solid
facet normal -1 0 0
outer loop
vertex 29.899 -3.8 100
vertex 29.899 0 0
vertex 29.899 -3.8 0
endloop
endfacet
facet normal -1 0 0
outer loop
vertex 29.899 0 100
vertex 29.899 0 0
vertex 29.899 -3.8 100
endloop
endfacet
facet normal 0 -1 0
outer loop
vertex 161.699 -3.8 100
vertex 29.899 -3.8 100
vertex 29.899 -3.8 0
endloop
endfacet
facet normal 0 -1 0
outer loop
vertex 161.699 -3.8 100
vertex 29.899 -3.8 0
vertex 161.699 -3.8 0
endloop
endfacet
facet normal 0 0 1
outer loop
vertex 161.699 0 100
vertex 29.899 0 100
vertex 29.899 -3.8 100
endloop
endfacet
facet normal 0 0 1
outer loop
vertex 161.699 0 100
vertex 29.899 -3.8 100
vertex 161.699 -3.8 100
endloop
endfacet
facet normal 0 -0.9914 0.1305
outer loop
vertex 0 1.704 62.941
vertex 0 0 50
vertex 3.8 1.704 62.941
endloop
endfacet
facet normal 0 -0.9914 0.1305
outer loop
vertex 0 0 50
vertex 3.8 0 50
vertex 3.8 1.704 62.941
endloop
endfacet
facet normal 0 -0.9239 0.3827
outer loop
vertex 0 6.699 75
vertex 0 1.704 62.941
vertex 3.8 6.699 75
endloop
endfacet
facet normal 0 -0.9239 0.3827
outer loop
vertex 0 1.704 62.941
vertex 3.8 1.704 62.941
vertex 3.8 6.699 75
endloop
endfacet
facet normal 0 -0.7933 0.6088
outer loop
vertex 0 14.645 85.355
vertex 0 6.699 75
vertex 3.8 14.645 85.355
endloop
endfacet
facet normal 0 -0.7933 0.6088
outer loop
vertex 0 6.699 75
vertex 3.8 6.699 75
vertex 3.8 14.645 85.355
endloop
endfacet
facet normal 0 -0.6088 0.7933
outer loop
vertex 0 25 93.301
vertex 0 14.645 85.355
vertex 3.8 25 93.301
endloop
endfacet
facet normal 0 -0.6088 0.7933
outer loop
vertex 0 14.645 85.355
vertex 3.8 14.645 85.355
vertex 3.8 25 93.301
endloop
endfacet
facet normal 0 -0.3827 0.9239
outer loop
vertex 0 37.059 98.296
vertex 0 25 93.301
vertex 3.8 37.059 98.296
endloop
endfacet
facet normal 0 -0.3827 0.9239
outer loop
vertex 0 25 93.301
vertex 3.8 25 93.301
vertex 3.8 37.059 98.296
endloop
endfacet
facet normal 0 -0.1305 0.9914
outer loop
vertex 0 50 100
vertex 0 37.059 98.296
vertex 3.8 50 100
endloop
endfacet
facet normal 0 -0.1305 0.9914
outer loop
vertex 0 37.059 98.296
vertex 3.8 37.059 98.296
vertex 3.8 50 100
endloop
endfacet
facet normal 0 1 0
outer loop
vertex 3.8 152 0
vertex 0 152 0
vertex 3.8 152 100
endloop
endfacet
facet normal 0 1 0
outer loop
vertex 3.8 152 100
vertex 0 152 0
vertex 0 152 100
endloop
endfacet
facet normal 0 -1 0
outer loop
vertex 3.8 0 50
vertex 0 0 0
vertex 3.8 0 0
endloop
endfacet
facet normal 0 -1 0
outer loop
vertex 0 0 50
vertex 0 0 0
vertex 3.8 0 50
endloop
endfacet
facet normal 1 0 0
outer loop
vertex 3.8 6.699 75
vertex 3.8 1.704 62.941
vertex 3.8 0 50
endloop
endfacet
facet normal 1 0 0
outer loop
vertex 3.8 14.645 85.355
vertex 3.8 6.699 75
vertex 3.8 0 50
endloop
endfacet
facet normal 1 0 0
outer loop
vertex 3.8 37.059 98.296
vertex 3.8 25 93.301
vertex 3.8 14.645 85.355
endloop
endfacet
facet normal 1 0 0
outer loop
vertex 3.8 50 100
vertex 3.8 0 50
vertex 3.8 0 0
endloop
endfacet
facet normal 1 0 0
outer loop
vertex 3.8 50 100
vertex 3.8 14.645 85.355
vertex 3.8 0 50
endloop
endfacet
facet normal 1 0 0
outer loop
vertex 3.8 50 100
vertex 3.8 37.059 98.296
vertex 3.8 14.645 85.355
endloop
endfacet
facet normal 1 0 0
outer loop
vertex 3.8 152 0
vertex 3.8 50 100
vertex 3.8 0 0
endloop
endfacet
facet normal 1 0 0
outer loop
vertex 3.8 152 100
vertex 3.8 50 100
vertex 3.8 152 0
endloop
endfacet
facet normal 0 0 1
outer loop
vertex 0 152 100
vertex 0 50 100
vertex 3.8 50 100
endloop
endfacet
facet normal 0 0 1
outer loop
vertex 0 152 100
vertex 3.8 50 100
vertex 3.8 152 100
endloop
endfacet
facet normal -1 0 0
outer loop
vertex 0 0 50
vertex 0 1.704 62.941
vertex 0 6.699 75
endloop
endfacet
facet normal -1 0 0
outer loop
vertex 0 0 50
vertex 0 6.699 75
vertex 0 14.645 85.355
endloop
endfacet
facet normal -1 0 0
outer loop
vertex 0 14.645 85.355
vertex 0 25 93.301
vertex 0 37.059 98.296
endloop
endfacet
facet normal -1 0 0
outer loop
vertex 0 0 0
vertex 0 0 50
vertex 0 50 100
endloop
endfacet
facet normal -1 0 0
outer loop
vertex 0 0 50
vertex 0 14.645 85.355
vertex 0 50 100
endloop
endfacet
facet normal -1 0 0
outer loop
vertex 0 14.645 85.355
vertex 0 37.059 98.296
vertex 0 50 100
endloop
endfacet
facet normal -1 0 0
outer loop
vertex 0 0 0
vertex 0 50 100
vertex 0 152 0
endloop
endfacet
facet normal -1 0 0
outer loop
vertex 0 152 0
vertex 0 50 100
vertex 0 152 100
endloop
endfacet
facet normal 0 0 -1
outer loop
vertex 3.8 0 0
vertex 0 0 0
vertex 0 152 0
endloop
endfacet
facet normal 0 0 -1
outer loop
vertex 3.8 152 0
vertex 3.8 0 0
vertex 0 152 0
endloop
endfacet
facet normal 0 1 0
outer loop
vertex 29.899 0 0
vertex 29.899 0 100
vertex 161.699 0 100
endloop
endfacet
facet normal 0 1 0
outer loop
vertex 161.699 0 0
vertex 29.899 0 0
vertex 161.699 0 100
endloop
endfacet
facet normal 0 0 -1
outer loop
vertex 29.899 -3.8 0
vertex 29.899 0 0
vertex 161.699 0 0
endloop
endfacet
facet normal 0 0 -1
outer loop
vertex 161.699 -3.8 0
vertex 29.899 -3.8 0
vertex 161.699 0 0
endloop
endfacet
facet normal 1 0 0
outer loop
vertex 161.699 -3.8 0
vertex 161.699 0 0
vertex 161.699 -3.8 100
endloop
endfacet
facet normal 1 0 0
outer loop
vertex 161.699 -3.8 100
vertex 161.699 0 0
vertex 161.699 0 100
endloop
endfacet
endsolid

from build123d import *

# Parameters (mm, degrees)
F0_W     = 152
F0_H     = 100
F1_DEPTH = 3.8
F2_R     = 50
F3_W     = 131.8
F3_H     = 100
F4_DEPTH = 3.8


with BuildPart() as f1:
    # F0 (on Right) → F1 (new body)
    with BuildSketch(Plane.YZ):
        with Locations((76, 50)):
            Rectangle(F0_W, F0_H)
    extrude(amount=F1_DEPTH)

    # F2
    f2_edges = [f1.edges().sort_by_distance(p)[0] for p in [
        (1.9, 0, 100),
    ]]
    fillet(f2_edges, radius=F2_R)


with BuildPart() as f4:
    # F3 (on Front) → F4 (new body)
    with BuildSketch(Plane.XZ):
        with Locations((95.798899, 50)):
            Rectangle(F3_W, F3_H)
    extrude(amount=F4_DEPTH)


solid = Compound([f1.part, f4.part])
